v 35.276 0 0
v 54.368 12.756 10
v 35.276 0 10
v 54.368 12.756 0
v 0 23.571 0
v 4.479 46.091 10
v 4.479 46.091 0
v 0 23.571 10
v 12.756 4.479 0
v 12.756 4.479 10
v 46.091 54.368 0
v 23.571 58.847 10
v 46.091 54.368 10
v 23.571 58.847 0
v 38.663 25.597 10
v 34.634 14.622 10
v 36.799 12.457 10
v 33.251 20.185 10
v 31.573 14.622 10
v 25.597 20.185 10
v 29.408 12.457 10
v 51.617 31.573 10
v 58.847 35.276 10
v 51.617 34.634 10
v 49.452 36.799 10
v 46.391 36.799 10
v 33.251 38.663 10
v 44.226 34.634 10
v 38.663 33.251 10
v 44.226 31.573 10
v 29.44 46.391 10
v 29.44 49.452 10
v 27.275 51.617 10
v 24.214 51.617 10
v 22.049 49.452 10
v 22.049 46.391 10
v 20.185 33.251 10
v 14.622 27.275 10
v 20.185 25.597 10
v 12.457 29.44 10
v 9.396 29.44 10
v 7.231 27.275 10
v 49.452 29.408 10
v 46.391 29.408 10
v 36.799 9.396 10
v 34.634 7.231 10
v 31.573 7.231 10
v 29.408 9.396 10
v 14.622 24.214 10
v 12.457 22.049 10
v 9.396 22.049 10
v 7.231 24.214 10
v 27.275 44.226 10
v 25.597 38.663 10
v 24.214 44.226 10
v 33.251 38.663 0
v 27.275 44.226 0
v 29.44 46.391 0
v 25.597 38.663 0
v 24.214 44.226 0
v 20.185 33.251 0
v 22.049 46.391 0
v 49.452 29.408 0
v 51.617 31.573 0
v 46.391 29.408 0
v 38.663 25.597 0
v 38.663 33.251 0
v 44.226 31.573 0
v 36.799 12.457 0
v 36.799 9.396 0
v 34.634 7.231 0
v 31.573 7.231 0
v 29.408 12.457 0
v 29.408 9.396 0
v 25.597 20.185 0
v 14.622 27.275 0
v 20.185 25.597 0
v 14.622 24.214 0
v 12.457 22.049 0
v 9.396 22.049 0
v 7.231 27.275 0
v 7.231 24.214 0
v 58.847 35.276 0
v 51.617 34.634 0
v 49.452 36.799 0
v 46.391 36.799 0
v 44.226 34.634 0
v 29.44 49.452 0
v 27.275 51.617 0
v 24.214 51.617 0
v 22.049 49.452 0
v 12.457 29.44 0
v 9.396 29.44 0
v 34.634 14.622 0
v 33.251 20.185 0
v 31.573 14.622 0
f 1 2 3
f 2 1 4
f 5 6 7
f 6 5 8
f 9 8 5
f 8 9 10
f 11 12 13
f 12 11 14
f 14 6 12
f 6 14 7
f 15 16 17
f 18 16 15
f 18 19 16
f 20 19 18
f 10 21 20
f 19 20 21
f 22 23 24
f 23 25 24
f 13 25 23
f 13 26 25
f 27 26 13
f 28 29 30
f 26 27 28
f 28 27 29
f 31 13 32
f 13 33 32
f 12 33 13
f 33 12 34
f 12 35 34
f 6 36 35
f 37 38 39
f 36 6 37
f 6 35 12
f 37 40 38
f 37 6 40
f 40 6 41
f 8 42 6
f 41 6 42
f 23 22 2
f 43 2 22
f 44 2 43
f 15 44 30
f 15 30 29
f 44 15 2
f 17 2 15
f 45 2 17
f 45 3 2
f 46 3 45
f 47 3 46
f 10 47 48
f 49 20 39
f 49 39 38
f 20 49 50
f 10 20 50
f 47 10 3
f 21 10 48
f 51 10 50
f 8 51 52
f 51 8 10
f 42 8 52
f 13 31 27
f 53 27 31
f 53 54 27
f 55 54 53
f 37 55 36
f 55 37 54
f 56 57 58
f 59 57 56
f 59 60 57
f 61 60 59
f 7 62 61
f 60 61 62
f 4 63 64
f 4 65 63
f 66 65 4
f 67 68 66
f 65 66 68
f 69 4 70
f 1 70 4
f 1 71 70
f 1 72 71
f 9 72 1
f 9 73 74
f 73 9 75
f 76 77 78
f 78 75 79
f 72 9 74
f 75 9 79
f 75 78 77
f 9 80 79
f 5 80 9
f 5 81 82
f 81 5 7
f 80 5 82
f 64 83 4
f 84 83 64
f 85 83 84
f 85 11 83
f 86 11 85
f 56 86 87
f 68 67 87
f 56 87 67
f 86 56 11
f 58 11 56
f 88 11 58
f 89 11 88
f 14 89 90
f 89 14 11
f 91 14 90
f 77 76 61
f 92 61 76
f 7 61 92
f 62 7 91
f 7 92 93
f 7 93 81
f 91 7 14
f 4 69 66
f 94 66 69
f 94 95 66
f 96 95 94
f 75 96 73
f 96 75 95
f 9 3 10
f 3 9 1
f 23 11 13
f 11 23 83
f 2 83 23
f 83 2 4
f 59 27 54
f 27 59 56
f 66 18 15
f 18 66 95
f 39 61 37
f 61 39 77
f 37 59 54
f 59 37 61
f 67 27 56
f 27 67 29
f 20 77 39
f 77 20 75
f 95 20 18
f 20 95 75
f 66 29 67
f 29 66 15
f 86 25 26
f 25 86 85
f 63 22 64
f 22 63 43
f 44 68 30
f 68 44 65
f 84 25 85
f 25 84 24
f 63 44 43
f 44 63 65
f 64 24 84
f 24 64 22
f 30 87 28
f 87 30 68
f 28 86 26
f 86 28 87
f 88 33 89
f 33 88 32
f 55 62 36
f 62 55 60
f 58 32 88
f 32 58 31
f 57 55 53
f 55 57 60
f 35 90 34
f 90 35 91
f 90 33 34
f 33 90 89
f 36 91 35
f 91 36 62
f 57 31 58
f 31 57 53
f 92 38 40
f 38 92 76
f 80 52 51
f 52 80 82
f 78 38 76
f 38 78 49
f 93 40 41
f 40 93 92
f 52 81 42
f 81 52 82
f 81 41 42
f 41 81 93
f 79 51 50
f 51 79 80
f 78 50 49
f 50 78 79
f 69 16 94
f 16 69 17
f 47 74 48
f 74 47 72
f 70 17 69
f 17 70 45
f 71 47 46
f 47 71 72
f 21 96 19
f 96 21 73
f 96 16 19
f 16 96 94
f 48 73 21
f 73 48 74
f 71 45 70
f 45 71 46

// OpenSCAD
$fn = 32;

// ----------------------------------------------------------------------
// Polygon plate: 8-gon R30, 4 bolt windows
// ----------------------------------------------------------------------

// --- parameters (mm) ---
sides = 8;                // number of polygon sides
plate_r = 30;             // circumscribed radius of the polygon
bore_r = 10;              // centre bore radius
bolts = 4;                // number of bolt windows
ring_r = 18.86;           // bolt-circle radius
bolt_r = 4;               // bolt window radius
plate_t = 10;             // plate thickness, Z (extrusion height)

plate_d = 2 * plate_r;  // circumscribed diameter
bore_d = 2 * bore_r;  // centre bore diameter
bolt_d = 2 * bolt_r;  // bolt window diameter
ring_d = 2 * ring_r;  // bolt-circle diameter

profile = [[58.847, 35.276], [46.091, 54.368], [23.571, 58.847], [4.479, 46.091], [0, 23.571], [12.756, 4.479], [35.276, 0], [54.368, 12.756]];  // primary outline, 8 points, counter clockwise
void_1 = [[38.663, 33.251], [33.251, 38.663], [25.597, 38.663], [20.185, 33.251], [20.185, 25.597], [25.597, 20.185], [33.251, 20.185], [38.663, 25.597]];  // centre bore, 8 points
void_2 = [[51.617, 34.634], [49.452, 36.799], [46.391, 36.799], [44.226, 34.634], [44.226, 31.573], [46.391, 29.408], [49.452, 29.408], [51.617, 31.573]];  // bolt window 1, 8 points
void_3 = [[29.44, 49.452], [27.275, 51.617], [24.214, 51.617], [22.049, 49.452], [22.049, 46.391], [24.214, 44.226], [27.275, 44.226], [29.44, 46.391]];  // bolt window 2, 8 points
void_4 = [[14.622, 27.275], [12.457, 29.44], [9.396, 29.44], [7.231, 27.275], [7.231, 24.214], [9.396, 22.049], [12.457, 22.049], [14.622, 24.214]];  // bolt window 3, 8 points
void_5 = [[36.799, 12.457], [34.634, 14.622], [31.573, 14.622], [29.408, 12.457], [29.408, 9.396], [31.573, 7.231], [34.634, 7.231], [36.799, 9.396]];  // bolt window 4, 8 points

// --- the one profile operation ---
difference() {
  linear_extrude(height = plate_t) polygon(points = profile);
  translate([0, 0, -1])
    linear_extrude(height = plate_t + 2) polygon(points = void_1);
  translate([0, 0, -1])
    linear_extrude(height = plate_t + 2) polygon(points = void_2);
  translate([0, 0, -1])
    linear_extrude(height = plate_t + 2) polygon(points = void_3);
  translate([0, 0, -1])
    linear_extrude(height = plate_t + 2) polygon(points = void_4);
  translate([0, 0, -1])
    linear_extrude(height = plate_t + 2) polygon(points = void_5);
}
